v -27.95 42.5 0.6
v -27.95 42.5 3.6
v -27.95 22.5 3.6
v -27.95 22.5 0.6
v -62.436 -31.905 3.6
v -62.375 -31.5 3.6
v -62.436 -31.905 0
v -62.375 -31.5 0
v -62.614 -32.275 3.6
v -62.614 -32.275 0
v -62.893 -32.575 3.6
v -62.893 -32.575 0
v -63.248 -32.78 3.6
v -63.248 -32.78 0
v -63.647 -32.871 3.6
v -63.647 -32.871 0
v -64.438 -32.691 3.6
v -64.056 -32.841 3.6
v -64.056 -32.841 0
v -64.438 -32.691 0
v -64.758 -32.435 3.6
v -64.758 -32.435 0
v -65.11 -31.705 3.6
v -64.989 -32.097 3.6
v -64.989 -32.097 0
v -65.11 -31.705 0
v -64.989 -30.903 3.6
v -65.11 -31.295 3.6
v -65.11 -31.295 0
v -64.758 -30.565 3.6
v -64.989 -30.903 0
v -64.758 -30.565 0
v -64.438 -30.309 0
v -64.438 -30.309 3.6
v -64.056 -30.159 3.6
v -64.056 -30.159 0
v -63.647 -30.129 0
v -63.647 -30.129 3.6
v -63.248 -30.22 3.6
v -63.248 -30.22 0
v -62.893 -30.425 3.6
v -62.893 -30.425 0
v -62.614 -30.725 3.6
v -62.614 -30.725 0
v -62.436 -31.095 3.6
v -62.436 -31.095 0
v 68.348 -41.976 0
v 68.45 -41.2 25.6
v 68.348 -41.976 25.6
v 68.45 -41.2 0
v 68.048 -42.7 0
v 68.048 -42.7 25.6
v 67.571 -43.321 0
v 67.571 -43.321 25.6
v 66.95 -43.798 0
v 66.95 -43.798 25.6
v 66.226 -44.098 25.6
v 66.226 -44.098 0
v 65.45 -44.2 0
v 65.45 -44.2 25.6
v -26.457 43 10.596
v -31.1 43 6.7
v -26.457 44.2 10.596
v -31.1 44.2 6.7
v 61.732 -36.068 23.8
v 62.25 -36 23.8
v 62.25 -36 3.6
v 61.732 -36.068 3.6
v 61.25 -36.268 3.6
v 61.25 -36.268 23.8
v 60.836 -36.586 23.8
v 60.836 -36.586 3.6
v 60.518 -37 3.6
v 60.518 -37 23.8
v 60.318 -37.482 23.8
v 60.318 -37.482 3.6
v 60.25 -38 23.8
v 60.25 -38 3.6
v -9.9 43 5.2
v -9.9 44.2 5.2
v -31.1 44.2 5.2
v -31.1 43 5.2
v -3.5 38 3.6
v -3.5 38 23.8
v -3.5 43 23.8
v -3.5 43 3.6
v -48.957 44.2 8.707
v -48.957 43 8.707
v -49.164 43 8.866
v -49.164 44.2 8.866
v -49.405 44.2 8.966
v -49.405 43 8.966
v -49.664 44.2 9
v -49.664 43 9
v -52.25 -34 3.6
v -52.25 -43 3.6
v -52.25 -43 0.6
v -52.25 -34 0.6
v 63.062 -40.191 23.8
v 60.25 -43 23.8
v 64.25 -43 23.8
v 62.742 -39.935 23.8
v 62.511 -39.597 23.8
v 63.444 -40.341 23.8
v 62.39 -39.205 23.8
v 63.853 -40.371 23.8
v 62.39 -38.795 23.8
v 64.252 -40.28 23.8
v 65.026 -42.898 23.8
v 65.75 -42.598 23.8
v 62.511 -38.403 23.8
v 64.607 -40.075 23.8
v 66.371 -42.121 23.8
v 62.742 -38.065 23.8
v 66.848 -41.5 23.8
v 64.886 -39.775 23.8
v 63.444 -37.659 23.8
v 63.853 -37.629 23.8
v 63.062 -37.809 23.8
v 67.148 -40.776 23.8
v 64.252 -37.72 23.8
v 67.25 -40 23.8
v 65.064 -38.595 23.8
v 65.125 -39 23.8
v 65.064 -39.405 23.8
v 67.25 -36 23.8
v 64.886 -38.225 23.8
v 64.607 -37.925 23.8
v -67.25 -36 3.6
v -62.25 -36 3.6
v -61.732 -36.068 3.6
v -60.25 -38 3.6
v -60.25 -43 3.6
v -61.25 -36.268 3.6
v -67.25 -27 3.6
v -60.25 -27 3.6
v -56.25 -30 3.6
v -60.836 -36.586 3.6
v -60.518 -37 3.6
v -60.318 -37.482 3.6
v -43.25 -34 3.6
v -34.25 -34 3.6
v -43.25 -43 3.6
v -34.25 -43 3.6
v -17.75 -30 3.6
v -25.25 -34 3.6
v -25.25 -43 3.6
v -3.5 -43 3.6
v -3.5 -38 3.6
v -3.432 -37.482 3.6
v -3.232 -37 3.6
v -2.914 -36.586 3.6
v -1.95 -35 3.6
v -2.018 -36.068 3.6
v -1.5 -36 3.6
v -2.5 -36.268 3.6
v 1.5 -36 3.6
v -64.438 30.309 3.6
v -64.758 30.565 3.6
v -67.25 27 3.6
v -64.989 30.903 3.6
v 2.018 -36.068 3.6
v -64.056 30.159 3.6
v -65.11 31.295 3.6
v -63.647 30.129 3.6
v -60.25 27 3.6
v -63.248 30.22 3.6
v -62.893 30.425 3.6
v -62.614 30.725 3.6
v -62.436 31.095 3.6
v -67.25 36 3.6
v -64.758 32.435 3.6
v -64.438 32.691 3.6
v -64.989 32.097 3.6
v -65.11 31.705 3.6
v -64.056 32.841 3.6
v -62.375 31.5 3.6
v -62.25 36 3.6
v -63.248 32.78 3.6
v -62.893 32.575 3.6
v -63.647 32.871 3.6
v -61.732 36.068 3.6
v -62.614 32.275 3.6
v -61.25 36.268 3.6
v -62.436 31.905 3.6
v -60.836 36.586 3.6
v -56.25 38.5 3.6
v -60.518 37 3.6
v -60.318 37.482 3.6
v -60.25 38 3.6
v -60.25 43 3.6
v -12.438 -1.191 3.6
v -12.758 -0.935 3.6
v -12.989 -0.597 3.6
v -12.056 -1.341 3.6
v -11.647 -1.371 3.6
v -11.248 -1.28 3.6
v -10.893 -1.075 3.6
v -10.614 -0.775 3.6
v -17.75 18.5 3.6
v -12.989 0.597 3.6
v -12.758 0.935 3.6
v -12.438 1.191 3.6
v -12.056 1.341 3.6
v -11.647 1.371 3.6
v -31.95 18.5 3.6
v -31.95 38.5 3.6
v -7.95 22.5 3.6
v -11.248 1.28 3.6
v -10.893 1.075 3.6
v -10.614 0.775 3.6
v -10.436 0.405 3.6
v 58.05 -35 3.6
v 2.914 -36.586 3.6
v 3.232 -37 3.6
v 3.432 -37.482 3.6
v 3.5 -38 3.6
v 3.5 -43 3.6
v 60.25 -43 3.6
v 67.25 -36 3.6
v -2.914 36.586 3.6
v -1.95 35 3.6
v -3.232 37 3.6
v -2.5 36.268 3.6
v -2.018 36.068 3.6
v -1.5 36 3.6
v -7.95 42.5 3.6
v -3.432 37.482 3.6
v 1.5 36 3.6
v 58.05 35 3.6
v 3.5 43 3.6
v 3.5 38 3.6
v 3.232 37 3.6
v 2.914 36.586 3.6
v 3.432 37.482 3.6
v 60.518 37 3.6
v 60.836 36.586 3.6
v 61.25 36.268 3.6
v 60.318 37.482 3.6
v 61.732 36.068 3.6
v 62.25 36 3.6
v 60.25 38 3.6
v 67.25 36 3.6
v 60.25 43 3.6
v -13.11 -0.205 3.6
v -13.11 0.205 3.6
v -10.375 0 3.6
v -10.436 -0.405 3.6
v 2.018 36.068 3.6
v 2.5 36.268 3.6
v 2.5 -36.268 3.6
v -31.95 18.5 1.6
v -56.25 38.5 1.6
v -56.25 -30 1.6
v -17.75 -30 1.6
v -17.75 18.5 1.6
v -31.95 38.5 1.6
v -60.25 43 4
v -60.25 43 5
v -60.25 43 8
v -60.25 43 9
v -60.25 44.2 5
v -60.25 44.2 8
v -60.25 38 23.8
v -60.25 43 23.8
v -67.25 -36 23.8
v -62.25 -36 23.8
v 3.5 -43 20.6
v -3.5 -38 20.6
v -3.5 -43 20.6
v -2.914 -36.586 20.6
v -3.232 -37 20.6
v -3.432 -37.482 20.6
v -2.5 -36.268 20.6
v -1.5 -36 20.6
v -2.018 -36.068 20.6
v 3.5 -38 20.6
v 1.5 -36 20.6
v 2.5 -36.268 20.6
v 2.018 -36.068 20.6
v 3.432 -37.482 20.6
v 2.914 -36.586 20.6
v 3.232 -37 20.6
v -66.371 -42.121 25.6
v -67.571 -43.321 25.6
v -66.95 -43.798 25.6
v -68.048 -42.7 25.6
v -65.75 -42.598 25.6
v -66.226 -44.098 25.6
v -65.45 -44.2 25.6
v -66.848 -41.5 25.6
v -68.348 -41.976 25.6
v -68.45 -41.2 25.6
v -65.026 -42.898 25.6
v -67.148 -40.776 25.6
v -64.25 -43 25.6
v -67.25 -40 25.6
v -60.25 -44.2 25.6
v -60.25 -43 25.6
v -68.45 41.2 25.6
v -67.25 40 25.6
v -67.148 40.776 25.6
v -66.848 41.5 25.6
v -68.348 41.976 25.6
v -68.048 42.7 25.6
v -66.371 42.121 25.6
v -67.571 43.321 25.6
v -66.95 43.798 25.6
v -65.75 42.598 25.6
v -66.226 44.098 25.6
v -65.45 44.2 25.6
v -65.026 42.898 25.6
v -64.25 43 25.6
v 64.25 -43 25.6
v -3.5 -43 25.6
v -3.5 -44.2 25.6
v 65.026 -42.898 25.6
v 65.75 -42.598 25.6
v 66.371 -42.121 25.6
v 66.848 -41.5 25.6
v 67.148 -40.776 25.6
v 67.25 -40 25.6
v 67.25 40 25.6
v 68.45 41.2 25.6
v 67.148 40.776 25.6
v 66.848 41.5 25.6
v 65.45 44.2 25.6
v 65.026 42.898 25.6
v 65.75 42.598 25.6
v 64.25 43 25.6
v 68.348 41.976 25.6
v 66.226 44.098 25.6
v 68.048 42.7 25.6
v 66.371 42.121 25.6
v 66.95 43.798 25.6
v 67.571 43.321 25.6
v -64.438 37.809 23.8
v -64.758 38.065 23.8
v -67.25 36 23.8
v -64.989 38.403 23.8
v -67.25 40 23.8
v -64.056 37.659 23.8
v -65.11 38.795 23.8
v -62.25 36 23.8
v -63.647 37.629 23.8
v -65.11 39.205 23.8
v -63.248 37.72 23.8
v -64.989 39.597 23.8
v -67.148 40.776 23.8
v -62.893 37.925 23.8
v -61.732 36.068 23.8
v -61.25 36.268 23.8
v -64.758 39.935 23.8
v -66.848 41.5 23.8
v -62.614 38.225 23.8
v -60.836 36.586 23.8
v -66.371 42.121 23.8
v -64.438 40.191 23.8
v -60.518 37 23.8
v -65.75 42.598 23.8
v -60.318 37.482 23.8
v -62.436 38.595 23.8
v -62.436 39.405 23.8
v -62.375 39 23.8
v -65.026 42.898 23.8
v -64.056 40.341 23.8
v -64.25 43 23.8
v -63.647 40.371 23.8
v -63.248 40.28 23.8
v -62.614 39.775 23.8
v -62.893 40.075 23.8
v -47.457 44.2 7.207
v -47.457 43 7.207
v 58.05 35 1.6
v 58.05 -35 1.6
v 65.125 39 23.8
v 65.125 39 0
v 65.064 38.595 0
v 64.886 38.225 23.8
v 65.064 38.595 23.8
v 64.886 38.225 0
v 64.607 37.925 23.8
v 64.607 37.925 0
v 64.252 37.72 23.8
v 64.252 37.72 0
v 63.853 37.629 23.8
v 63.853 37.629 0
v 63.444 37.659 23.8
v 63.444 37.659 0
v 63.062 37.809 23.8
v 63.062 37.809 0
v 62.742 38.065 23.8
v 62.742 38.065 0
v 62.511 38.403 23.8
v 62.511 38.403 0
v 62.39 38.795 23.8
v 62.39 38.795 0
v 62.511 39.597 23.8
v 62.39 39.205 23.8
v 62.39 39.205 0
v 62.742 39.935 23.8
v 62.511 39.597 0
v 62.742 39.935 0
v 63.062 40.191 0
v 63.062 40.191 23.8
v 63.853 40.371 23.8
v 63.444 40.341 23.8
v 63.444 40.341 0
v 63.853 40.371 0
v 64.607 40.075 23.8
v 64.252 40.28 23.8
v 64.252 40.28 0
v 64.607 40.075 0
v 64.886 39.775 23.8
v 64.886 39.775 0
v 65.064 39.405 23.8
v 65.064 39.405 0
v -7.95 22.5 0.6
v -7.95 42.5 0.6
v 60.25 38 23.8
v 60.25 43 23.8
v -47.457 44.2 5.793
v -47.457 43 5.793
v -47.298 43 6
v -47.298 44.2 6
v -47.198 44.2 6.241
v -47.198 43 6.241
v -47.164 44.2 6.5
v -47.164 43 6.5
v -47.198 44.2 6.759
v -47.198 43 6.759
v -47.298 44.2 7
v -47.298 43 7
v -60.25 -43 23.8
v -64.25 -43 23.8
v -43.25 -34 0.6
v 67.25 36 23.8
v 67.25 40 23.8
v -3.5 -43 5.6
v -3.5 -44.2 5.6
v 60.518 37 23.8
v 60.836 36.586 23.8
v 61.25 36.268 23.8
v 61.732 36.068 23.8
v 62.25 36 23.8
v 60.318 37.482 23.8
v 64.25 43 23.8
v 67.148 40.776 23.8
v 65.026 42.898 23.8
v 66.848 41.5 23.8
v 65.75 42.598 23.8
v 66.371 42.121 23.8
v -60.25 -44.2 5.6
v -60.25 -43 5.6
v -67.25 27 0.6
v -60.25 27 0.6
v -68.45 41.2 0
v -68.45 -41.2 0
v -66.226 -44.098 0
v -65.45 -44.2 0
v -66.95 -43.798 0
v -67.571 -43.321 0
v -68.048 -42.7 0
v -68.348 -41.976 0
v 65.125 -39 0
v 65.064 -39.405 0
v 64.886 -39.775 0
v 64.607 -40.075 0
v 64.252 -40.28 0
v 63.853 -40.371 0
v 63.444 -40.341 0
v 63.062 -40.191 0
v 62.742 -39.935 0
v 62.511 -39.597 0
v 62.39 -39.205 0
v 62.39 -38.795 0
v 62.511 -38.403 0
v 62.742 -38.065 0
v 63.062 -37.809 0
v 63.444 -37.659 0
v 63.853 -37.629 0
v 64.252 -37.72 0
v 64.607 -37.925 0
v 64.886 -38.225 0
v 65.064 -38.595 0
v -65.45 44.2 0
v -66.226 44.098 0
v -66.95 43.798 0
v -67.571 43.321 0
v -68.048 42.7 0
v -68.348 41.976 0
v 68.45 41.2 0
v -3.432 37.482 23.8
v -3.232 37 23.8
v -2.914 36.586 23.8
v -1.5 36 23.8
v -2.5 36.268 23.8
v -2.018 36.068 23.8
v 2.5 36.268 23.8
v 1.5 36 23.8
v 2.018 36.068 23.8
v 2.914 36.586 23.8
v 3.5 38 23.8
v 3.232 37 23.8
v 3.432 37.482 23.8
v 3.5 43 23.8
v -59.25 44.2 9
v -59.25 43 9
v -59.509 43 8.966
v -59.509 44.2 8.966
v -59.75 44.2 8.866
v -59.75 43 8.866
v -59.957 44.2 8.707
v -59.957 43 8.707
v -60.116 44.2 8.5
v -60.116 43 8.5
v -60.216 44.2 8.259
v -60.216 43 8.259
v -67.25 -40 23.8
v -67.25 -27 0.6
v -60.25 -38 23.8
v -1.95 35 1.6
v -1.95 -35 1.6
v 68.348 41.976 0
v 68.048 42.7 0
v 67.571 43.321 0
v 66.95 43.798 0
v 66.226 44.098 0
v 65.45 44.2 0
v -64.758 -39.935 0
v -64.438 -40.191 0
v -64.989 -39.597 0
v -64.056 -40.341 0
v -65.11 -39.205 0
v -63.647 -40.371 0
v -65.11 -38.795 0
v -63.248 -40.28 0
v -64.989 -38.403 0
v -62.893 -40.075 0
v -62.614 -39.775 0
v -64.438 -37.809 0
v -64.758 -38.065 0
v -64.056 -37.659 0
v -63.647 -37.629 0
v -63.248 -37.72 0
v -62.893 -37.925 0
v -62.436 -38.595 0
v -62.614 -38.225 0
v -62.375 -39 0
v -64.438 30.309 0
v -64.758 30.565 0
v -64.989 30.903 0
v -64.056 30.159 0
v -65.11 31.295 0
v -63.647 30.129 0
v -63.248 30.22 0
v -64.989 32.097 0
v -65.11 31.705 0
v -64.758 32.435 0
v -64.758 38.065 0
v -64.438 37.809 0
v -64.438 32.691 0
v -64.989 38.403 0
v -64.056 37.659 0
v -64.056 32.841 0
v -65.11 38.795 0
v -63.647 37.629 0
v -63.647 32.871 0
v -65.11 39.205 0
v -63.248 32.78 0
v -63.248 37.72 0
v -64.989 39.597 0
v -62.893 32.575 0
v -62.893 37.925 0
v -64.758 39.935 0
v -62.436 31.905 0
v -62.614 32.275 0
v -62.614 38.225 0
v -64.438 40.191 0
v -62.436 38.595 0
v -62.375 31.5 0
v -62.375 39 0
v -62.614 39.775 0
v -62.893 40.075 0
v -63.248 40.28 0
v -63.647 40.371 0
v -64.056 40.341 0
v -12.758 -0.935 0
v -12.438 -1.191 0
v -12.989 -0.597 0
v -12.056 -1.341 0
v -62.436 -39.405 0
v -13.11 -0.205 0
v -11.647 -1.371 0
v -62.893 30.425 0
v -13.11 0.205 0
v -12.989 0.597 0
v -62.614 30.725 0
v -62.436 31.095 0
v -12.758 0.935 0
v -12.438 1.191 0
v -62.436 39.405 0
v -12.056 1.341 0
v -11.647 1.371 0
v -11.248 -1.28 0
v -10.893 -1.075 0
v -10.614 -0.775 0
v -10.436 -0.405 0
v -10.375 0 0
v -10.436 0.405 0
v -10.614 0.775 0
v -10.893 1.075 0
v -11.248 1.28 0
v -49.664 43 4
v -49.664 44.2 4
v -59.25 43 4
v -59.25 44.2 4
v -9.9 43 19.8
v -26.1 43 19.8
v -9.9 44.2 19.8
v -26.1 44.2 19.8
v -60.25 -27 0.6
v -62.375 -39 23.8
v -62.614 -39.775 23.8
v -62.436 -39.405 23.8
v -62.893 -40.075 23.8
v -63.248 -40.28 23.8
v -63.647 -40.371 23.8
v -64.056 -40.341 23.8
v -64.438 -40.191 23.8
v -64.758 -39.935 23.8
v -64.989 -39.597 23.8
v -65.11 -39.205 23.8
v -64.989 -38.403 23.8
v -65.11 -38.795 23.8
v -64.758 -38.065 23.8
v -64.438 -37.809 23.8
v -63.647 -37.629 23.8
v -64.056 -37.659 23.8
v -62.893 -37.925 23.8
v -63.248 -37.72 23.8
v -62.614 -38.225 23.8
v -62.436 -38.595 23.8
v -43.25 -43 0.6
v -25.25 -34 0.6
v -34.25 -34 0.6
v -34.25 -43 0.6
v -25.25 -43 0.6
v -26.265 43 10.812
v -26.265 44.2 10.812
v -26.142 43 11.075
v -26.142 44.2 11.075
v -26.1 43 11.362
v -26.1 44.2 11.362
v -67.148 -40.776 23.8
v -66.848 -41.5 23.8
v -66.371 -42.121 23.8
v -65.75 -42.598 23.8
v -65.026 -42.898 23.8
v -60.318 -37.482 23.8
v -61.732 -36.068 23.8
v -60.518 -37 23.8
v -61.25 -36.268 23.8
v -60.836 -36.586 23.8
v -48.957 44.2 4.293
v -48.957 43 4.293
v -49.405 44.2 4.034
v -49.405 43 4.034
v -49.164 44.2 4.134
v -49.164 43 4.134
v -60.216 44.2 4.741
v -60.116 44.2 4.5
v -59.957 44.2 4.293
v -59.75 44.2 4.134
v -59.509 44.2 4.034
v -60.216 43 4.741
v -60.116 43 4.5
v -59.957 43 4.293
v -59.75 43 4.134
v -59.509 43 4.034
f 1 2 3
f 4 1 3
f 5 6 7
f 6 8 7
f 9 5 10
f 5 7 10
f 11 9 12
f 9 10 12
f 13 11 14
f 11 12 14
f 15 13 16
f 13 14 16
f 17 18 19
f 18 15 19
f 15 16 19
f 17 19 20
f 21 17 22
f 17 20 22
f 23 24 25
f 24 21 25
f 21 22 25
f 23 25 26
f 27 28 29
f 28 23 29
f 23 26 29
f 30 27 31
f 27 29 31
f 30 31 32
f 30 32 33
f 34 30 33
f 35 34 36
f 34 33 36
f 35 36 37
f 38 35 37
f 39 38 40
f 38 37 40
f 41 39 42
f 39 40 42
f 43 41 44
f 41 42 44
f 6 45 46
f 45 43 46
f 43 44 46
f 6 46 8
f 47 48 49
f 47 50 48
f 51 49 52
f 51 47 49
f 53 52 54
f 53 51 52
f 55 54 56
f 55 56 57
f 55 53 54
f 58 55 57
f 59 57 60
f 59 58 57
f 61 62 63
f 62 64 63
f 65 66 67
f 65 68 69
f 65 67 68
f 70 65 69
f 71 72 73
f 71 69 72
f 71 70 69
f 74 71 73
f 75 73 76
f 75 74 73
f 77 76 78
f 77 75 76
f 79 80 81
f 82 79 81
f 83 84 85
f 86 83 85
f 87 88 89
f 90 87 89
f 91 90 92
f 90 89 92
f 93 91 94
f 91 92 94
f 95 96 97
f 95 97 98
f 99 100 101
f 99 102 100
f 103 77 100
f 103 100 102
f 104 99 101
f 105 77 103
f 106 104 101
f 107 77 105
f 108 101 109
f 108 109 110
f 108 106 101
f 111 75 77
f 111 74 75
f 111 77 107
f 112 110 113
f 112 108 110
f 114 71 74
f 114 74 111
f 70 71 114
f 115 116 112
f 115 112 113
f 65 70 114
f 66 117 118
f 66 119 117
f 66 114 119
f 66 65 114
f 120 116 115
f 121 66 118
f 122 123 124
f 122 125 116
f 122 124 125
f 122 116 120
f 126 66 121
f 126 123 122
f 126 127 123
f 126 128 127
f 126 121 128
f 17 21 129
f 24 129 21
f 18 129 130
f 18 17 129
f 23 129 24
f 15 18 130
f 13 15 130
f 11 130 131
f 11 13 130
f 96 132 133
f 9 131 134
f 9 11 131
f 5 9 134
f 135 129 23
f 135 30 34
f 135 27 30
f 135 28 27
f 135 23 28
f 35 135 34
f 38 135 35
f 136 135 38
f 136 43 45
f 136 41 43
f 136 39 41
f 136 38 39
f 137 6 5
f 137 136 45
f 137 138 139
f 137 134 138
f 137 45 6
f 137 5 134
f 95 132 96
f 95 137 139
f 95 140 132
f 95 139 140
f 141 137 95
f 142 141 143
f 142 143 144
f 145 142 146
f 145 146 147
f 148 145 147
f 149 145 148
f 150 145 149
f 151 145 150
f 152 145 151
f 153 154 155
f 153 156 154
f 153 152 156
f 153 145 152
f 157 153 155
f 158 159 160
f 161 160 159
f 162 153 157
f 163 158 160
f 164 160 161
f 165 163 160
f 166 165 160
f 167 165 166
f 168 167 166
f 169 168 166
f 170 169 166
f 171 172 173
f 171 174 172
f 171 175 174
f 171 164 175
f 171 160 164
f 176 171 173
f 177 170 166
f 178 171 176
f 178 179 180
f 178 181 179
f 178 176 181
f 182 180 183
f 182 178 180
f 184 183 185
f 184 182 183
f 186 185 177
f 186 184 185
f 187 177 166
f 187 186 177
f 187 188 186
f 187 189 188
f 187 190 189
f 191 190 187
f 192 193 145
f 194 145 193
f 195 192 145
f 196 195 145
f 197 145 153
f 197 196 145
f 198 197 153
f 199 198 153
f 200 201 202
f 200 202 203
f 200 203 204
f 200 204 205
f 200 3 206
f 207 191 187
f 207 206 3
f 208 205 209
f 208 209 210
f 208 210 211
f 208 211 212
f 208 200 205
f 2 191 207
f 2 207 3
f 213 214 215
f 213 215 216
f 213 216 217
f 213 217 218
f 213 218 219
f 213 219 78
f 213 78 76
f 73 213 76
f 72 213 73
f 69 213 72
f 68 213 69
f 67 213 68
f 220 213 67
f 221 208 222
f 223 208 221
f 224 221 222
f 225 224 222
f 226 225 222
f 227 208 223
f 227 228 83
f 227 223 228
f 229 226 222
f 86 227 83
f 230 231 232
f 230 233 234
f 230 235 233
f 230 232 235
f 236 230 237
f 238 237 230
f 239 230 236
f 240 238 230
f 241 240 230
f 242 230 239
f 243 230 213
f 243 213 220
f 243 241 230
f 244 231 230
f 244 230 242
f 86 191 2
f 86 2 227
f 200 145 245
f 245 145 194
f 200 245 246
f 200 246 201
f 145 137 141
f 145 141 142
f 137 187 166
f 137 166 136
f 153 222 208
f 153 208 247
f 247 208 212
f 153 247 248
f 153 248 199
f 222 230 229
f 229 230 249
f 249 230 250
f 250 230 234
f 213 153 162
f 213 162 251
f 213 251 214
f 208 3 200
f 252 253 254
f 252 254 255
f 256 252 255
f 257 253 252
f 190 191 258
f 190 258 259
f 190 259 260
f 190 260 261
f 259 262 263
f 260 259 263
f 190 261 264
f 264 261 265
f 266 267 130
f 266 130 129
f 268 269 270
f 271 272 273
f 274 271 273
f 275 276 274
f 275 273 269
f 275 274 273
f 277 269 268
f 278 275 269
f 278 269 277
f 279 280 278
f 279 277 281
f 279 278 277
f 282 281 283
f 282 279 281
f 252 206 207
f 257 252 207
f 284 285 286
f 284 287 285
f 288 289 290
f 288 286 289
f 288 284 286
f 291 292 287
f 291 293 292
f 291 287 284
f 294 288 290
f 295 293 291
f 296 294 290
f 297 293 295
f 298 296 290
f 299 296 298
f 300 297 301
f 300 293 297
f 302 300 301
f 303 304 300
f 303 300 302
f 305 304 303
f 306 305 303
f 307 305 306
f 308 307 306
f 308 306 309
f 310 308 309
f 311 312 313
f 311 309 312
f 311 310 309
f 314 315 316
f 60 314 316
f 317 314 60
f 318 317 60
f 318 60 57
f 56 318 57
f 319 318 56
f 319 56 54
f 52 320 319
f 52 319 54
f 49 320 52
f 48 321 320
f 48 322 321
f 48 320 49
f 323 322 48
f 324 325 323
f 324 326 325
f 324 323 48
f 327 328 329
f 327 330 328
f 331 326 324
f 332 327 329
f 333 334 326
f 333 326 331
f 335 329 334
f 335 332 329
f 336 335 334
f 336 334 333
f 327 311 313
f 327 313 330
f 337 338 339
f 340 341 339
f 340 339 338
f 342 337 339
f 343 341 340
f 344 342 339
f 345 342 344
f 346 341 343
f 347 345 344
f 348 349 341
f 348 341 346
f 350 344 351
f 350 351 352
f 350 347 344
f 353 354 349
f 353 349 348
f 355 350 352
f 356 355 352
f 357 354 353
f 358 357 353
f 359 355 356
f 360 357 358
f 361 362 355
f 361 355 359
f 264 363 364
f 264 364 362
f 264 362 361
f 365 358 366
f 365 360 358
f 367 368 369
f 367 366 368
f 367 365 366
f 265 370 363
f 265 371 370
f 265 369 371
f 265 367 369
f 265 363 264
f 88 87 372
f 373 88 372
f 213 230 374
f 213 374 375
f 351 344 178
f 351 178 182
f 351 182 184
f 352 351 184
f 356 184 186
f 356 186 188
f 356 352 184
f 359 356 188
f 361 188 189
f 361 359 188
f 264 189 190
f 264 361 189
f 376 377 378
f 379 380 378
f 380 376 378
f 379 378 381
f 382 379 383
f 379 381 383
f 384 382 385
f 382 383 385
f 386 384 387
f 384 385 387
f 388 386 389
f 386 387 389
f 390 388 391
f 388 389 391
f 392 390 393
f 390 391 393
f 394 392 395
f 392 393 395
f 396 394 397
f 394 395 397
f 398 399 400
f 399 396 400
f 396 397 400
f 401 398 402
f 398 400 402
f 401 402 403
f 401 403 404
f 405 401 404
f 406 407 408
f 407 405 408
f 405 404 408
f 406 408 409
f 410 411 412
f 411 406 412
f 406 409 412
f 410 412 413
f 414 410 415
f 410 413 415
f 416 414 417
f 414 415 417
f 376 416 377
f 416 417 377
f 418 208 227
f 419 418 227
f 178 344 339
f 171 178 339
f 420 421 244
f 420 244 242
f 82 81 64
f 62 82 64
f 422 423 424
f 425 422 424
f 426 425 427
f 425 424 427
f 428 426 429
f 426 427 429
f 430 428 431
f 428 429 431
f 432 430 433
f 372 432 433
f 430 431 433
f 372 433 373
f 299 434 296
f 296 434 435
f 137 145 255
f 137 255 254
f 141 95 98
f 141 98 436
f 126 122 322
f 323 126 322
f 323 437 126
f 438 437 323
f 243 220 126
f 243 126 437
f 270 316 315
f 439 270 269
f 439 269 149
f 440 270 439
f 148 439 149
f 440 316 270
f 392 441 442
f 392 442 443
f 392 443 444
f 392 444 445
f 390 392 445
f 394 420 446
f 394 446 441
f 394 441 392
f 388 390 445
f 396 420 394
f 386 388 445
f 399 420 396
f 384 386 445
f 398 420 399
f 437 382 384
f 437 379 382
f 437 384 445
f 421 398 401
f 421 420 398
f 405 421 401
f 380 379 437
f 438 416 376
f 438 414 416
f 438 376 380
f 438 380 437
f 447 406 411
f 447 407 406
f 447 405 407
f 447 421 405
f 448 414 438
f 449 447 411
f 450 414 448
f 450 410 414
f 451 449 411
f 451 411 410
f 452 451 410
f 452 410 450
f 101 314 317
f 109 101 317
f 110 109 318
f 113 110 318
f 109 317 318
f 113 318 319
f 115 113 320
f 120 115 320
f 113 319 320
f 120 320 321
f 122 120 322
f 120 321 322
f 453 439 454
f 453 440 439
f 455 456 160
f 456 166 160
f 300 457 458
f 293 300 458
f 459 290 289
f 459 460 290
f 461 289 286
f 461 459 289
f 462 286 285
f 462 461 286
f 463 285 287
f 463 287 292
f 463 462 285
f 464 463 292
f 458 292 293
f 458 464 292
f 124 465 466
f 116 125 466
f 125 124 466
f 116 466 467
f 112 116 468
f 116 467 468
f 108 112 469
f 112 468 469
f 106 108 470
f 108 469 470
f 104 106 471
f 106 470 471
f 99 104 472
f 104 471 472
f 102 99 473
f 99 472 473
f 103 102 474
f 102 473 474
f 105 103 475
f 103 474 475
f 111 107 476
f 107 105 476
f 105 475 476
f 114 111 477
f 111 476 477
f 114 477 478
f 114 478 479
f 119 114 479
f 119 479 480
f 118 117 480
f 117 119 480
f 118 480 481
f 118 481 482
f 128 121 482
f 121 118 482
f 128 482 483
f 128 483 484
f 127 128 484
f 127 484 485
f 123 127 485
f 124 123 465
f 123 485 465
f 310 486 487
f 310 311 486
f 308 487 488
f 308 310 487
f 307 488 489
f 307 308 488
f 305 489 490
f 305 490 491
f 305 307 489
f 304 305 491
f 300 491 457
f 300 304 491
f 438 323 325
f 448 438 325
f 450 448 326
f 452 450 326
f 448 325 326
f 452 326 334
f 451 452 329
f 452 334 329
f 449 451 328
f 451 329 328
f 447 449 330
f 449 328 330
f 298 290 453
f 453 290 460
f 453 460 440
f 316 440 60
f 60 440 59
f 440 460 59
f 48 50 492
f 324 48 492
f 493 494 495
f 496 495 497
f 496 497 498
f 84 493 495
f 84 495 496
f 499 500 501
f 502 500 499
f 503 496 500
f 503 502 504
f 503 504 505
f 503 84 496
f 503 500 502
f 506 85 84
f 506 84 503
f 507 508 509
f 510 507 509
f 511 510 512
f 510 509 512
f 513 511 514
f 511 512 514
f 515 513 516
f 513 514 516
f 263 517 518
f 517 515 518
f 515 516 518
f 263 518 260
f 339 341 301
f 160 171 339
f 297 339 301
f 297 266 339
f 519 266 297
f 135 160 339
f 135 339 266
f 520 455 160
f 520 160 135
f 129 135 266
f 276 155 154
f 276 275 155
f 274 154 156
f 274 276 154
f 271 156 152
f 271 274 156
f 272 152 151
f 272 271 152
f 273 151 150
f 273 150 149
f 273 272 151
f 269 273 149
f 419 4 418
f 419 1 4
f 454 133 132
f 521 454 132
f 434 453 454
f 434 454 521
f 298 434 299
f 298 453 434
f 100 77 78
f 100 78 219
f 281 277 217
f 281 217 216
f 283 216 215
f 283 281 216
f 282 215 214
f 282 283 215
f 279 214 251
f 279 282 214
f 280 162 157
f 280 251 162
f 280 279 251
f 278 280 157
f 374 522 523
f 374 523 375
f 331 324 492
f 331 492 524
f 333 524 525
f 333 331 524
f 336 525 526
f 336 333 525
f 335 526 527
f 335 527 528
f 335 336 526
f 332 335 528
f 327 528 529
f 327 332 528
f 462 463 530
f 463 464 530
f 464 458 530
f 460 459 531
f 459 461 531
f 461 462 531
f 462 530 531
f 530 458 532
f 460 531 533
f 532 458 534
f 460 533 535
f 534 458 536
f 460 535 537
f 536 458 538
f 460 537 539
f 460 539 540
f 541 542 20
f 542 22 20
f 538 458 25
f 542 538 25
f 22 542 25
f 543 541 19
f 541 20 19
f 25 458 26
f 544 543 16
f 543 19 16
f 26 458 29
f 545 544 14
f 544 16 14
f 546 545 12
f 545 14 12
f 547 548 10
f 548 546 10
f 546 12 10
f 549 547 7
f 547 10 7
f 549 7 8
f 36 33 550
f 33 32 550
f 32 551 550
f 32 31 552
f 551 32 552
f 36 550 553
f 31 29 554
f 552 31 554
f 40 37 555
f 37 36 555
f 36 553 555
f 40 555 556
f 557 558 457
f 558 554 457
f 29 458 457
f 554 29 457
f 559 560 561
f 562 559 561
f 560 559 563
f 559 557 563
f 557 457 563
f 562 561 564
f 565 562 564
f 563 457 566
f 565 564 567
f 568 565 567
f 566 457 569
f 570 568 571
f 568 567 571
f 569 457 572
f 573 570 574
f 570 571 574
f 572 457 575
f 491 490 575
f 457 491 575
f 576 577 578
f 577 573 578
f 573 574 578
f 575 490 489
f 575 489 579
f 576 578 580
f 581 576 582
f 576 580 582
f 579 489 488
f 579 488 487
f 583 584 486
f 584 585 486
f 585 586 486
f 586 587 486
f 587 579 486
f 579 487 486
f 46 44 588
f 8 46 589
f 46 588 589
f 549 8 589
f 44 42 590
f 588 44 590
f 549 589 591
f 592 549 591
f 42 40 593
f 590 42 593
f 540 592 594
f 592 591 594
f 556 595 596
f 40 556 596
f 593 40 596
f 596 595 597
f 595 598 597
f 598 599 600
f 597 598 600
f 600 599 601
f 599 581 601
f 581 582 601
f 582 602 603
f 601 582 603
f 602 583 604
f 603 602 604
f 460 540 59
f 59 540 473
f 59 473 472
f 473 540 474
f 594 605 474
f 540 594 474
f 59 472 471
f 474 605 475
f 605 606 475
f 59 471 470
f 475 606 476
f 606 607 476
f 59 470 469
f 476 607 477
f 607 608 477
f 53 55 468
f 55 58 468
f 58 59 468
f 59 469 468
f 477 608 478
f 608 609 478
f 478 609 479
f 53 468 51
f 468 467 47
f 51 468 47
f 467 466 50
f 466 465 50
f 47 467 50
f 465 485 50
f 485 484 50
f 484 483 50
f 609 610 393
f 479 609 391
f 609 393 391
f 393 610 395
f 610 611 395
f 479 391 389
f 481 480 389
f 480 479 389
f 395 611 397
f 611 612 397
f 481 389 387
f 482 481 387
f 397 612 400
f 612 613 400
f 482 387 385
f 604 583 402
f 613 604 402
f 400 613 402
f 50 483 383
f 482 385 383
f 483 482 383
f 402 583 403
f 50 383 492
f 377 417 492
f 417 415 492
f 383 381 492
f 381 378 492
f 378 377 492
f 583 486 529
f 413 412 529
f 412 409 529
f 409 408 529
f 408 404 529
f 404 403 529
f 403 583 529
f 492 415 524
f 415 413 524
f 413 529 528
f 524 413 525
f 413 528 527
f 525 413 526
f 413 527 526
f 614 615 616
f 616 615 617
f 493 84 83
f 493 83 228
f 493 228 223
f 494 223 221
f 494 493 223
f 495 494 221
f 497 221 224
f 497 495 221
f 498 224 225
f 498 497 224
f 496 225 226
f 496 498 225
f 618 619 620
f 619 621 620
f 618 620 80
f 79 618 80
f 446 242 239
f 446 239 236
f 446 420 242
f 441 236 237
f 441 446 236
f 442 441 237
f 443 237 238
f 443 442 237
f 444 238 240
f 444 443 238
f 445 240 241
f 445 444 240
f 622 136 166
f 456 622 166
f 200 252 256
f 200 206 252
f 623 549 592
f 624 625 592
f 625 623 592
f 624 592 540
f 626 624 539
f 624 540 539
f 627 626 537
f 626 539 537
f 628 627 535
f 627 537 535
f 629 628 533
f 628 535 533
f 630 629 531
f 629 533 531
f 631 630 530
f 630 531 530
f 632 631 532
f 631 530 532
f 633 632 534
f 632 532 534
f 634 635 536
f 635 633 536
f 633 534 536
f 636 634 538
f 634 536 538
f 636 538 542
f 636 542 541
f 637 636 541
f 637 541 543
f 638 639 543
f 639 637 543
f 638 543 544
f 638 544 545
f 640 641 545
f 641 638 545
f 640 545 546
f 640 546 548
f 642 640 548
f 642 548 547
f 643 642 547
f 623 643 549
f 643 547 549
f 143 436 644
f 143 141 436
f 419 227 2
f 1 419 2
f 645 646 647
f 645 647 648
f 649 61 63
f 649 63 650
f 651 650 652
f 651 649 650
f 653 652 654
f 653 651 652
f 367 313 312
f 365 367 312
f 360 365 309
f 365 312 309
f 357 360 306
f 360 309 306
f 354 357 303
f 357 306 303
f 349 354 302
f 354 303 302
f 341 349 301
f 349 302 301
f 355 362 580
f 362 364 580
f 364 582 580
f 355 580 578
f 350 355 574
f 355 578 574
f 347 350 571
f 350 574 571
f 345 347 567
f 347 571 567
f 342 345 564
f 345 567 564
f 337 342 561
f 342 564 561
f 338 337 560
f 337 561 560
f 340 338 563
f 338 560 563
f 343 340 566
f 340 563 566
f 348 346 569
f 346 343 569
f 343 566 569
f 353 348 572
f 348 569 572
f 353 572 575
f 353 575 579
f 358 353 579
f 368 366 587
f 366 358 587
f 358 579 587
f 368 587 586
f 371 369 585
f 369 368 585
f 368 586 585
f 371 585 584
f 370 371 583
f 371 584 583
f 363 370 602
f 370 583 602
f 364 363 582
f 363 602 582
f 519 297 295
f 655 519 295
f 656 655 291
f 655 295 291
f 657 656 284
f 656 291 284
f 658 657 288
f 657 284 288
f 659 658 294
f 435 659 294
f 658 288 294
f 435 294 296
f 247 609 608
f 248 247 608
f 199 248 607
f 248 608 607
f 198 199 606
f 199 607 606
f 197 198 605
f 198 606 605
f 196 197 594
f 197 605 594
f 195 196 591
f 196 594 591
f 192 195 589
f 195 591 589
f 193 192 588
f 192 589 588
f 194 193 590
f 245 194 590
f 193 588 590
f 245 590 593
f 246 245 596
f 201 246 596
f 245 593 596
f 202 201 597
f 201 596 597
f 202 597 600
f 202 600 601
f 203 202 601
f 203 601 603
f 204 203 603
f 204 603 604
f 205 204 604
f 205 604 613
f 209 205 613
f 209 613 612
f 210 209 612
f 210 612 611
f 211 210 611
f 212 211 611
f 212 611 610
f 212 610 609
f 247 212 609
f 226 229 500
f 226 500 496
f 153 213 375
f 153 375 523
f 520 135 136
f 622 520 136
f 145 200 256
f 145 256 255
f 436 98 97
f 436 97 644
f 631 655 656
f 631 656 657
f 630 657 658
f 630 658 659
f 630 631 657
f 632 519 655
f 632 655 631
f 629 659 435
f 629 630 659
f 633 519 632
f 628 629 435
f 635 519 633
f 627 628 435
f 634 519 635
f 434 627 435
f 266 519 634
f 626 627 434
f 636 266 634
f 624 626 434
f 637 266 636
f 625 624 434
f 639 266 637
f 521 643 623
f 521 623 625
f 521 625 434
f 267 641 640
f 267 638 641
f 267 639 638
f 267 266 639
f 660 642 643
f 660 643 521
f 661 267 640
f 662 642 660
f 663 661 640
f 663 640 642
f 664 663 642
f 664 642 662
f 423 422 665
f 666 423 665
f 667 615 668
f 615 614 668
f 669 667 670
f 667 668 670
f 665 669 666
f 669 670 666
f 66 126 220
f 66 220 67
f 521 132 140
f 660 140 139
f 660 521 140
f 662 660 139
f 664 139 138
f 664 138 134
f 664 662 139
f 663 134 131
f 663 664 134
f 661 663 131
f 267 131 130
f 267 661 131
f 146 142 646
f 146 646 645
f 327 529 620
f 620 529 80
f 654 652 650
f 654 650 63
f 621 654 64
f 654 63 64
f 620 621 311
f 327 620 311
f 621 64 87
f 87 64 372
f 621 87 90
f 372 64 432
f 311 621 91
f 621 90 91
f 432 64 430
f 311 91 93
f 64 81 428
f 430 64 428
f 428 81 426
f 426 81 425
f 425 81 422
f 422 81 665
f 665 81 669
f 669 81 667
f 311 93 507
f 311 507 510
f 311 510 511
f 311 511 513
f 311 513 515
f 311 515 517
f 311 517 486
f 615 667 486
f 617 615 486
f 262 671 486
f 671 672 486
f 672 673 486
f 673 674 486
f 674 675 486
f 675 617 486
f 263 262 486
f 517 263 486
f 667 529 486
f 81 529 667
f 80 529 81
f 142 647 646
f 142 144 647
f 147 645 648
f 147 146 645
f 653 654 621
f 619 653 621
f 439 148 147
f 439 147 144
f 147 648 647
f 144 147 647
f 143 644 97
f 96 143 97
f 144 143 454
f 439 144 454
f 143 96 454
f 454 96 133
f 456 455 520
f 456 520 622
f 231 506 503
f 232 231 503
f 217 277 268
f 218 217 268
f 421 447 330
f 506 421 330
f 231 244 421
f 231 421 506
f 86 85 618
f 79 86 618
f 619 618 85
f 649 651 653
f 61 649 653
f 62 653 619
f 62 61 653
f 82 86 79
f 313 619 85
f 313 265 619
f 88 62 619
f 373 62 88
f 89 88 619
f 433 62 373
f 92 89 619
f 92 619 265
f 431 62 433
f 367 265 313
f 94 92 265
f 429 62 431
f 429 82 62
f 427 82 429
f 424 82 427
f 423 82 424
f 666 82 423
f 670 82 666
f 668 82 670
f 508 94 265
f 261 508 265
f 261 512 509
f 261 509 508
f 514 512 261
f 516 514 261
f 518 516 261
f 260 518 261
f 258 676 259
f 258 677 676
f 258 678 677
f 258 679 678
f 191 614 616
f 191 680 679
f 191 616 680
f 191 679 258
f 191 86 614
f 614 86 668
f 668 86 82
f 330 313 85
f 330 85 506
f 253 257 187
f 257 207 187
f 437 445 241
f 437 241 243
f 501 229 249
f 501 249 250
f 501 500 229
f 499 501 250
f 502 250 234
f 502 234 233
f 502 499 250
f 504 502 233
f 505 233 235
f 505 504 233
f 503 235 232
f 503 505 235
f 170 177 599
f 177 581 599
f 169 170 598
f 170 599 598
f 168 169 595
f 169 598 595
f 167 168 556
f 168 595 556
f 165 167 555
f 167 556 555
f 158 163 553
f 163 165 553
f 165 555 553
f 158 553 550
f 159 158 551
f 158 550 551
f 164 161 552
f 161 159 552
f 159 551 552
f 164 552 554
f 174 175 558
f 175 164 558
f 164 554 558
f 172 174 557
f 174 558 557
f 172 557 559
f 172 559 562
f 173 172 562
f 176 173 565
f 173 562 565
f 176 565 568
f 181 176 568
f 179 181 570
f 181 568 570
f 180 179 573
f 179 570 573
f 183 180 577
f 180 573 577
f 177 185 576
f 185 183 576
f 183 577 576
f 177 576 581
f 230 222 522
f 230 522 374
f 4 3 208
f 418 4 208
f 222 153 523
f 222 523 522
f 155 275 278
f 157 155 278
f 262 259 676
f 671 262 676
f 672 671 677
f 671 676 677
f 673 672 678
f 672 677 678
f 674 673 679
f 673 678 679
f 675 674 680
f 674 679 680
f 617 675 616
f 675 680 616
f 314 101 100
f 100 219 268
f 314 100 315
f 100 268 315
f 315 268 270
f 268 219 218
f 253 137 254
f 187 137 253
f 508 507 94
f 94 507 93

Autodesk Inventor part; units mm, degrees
ref_plane "YZ Plane" through (0, 0, 0) normal (1, 0, 0) x (0, 1, 0)
ref_plane "XZ Plane" through (0, 0, 0) normal (0, 1, 0) x (-1, 0, 0)
ref_plane "XY Plane" through (0, 0, 0) normal (0, 0, 1) x (1, 0, 0)
sketch "Skizze1" plane through (0, 0, 0) normal (0, 0, 1) x (1, 0, 0)
  line L0 (-68.45, -44.2) -> (68.45, -44.2)
  line L1 (68.45, -44.2) -> (68.45, 44.2)
  line L2 (68.45, 44.2) -> (-68.45, 44.2)
  line L3 (-68.45, 44.2) -> (-68.45, -44.2)
  line L4 (-68.45, -44.2) -> (68.45, 44.2) construction
  line L5 (68.45, -44.2) -> (-68.45, 44.2) construction
  circle A0 centre (-63.75, -39) radius 1.375
  circle A1 centre (63.75, -39) radius 1.375
  circle A2 centre (63.75, 39) radius 1.375
  circle A3 centre (-63.75, 39) radius 1.375
  line L6 (0, 61.88) -> (0, -61.88) projected
  line L7 (-95.83, 0) -> (95.83, 0) projected
  circle A4 centre (-63.75, 31.5) radius 1.375
  circle A5 centre (-63.75, -31.5) radius 1.375
  line L8 (-63.75, 39) -> (-63.75, 31.5) construction
  circle A6 centre (-11.75, 0) radius 1.375
  point P0 (0, 0)
  dimension "d0" = 136.9
  dimension "d1" = 88.4
  dimension "d2" = 2.75
  dimension "d3" = 127.5
  dimension "d4" = 78
  dimension "d7" = 63
  dimension "d8" = 2.75
  dimension "d9" = 2.75
  dimension "d10" = 52
extrude "Extrusion1" add sketch "Skizze1" along normal blind 3.6 contours L3 L7 A6 L6 L0 | L6 L7 L1 L0 | L3 L2 L6 L7 A6 | L6 L2 L1 L7
sketch "Skizze2" plane through (0, 0, 0) normal (0, 0, -1) x (-1, 0, 0)
  circle A0 centre (63.75, -31.5) radius 1.375 projected
  circle A1 centre (63.75, 31.5) radius 1.375 projected
  circle A2 centre (11.75, 0) radius 1.375 projected
  line L0 (67.05, -28.2) -> (60.45, -28.2)
  line L1 (60.45, -28.2) -> (60.45, -34.8)
  line L2 (60.45, -34.8) -> (67.05, -34.8)
  line L3 (67.05, -34.8) -> (67.05, -28.2)
  line L4 (67.05, -28.2) -> (60.45, -34.8) construction
  line L5 (60.45, -28.2) -> (67.05, -34.8) construction
  line L6 (67.05, 34.8) -> (60.45, 34.8)
  line L7 (60.45, 34.8) -> (60.45, 28.2)
  line L8 (60.45, 28.2) -> (67.05, 28.2)
  line L9 (67.05, 28.2) -> (67.05, 34.8)
  circle A3 centre (63.75, 31.5) radius 1.375 projected
  line L10 (67.05, 34.8) -> (60.45, 28.2) construction
  line L11 (60.45, 34.8) -> (67.05, 28.2) construction
  line L12 (15.05, 3.3) -> (8.45, 3.3)
  line L13 (8.45, 3.3) -> (8.45, -3.3)
  line L14 (8.45, -3.3) -> (15.05, -3.3)
  line L15 (15.05, -3.3) -> (15.05, 3.3)
  line L16 (15.05, 3.3) -> (8.45, -3.3) construction
  line L17 (8.45, 3.3) -> (15.05, -3.3) construction
  point P0 (0, 0)
  dimension "d11" = 6.6
  dimension "d12" = 6.6
extrude "Extrusion2" [suppressed]
sketch "Skizze3" plane through (0, 0, 3.6) normal (0, 0, 1) x (1, 0, 0)
  circle A0 centre (-63.75, 31.5) radius 1.375 projected
  circle A1 centre (-63.75, -31.5) radius 1.375 projected
  circle A2 centre (-11.75, 0) radius 1.375 projected
  line L0 (-63.75, 31.5) -> (-63.75, -31.5) construction
  line L1 (-95.83, 0) -> (95.83, 0) projected
  line L2 (-67.25, -27) -> (-60.25, -27)
  line L3 (-60.25, -27) -> (-60.25, 27)
  line L4 (-60.25, 27) -> (-67.25, 27)
  line L5 (-67.25, 27) -> (-67.25, -27)
  line L6 (-67.25, -27) -> (-60.25, 27) construction
  line L7 (-60.25, -27) -> (-67.25, 27) construction
  line L8 (-52.25, -34) -> (-43.25, -34)
  line L9 (-43.25, -34) -> (-43.25, -43)
  line L10 (-43.25, -43) -> (-52.25, -43)
  line L11 (-52.25, -43) -> (-52.25, -34)
  line L12 (-34.25, -34) -> (-25.25, -34)
  line L13 (-25.25, -34) -> (-25.25, -43)
  line L14 (-25.25, -43) -> (-34.25, -43)
  line L15 (-34.25, -43) -> (-34.25, -34)
  line L16 (-47.75, -34) -> (-47.75, -43) construction
  line L17 (-29.75, -34) -> (-29.75, -43) construction
  line L18 (-52.25, -38.5) -> (-43.25, -38.5) construction
  line L19 (-27.95, 22.5) -> (-7.95, 22.5)
  line L20 (-7.95, 22.5) -> (-7.95, 42.5)
  line L21 (-7.95, 42.5) -> (-27.95, 42.5)
  line L22 (-27.95, 42.5) -> (-27.95, 22.5)
  line L23 (-17.95, 42.5) -> (-17.95, 22.5) construction
  point P0 (0, 0)
  point P1 (-63.75, 0)
  dimension "d15" = 7
  dimension "d16" = 54
  dimension "d17" = 9
  dimension "d18" = 9
  dimension "d19" = 9
  dimension "d20" = 18
  dimension "d21" = 16
  dimension "d22" = 7
  dimension "d23" = 20
  dimension "d25" = 11
  dimension "d26" = 20
  dimension "d29" = 45.8
extrude "Extrusion3" cut sketch "Skizze3" against normal blind 3 contours L3 L2 L5 L1 | L1 L5 L4 L3 | L8 L9 L10 L11 | L12 L13 L14 L15 | L22 L21 L20 L19
sketch "Skizze4" plane through (0, 0, 3.6) normal (0, 0, 1) x (1, 0, 0)
  line L0 (-31.95, 18.5) -> (-17.75, 18.5)
  line L1 (-17.75, 18.5) -> (-17.75, -30)
  line L2 (-17.75, -30) -> (-56.25, -30)
  line L3 (-56.25, -30) -> (-56.25, 38.5)
  line L4 (-31.95, 18.5) -> (-31.95, 38.5)
  line L5 (-31.95, 38.5) -> (-56.25, 38.5)
  line L6 (-1.95, 35) -> (58.05, 35)
  line L7 (58.05, 35) -> (58.05, -35)
  line L8 (58.05, -35) -> (-1.95, -35)
  line L9 (-1.95, -35) -> (-1.95, 35)
  line L10 (-7.95, 22.5) -> (-27.95, 22.5) projected
  line L11 (-7.95, 42.5) -> (-7.95, 22.5) projected
  line L12 (-27.95, 42.5) -> (-7.95, 42.5) projected
  line L13 (-27.95, 22.5) -> (-27.95, 42.5) projected
  line L14 (-60.25, -27) -> (-67.25, -27) projected
  line L15 (-60.25, 27) -> (-60.25, -27) projected
  line L16 (-67.25, 27) -> (-60.25, 27) projected
  line L17 (-67.25, -27) -> (-67.25, 27) projected
  line L18 (-34.25, -34) -> (-25.25, -34) projected
  line L19 (-34.25, -43) -> (-34.25, -34) projected
  line L20 (-25.25, -43) -> (-34.25, -43) projected
  line L21 (-25.25, -34) -> (-25.25, -43) projected
  circle A0 centre (-11.75, 0) radius 1.375 projected
  line L22 (-95.83, 0) -> (95.83, 0) projected
  line L23 (0, 61.88) -> (0, -61.88) projected
  point P0 (0, 0)
  dimension "d30" = 4
  dimension "d31" = 4
  dimension "d32" = 4
  dimension "d34" = 4
  dimension "d35" = 6
  dimension "d36" = 4
  dimension "d37" = 6
  dimension "d38" = 70
  dimension "d39" = 60
extrude "Extrusion4" cut sketch "Skizze4" against normal blind 2 contours L9 L6 L23 L22 | L22 L23 L8 L9 | L0 L1 L22 L3 L5 L4 | L1 L2 L3 L22 | L23 L6 L7 L22 | L22 L7 L8 L23
sketch "Skizze5" plane through (0, 0, 3.6) normal (0, 0, 1) x (1, 0, 0)
  circle A0 centre (-63.75, 39) radius 1.375 projected
  circle A1 centre (-63.75, -39) radius 1.375 projected
  circle A2 centre (63.75, -39) radius 1.375 projected
  circle A3 centre (63.75, 39) radius 1.375 projected
  line L0 (-67.25, 43) -> (-60.25, 43)
  line L1 (-60.25, 43) -> (-60.25, 36)
  line L2 (-60.25, 36) -> (-67.25, 36)
  line L3 (-67.25, 36) -> (-67.25, 43)
  line L4 (-67.25, -43) -> (-60.25, -43)
  line L5 (-60.25, -43) -> (-60.25, -36)
  line L6 (-60.25, -36) -> (-67.25, -36)
  line L7 (-67.25, -36) -> (-67.25, -43)
  line L8 (60.25, 36) -> (67.25, 36)
  line L9 (67.25, 36) -> (67.25, 43)
  line L10 (67.25, 43) -> (60.25, 43)
  line L11 (60.25, 43) -> (60.25, 36)
  circle A4 centre (63.75, 39) radius 1.375 projected
  line L12 (60.25, -43) -> (67.25, -43)
  line L13 (67.25, -43) -> (67.25, -36)
  line L14 (67.25, -36) -> (60.25, -36)
  line L15 (60.25, -36) -> (60.25, -43)
  line L16 (0, 61.88) -> (0, -61.88) projected
  line L17 (-95.83, 0) -> (95.83, 0) projected
  line L18 (-63.75, 36) -> (-63.75, 43) construction
  line L19 (3.5, -43) -> (-3.5, -43)
  line L20 (-3.5, -43) -> (-3.5, -36)
  line L21 (-3.5, -36) -> (3.5, -36)
  line L22 (3.5, -36) -> (3.5, -43)
  line L23 (3.5, 36) -> (-3.5, 36)
  line L24 (-3.5, 36) -> (-3.5, 43)
  line L25 (-3.5, 43) -> (3.5, 43)
  line L26 (3.5, 43) -> (3.5, 36)
  point P0 (0, 0)
  dimension "d42" = 7
  dimension "d46" = 3
  dimension "d47" = 4
  dimension "d51" = 7
extrude "Extrusion5" add sketch "Skizze5" along normal blind 20.2
sketch "Skizze7" plane through (0, 0, 23.8) normal (0, 0, 1) x (1, 0, 0)
  line L0 (-3.5, -43) -> (3.5, -43) projected
  line L1 (3.5, -43) -> (3.5, -36) projected
  line L2 (3.5, -36) -> (-3.5, -36) projected
  line L3 (-3.5, -36) -> (-3.5, -43) projected
  point P0 (0, 0)
extrude "Extrusion7" cut sketch "Skizze7" against normal blind 3.2
fillet "Rundung1" radius 2 8 edges at (-60.25, 36, 13.7) (-60.25, -36, 13.7) (60.25, 36, 13.7) (60.25, -36, 13.7) (3.5, -36, 12.1) (3.5, 36, 13.7) (-3.5, 36, 13.7) (-3.5, -36, 12.1)
sketch "Skizze6" plane through (0, 0, 3.6) normal (0, 0, 1) x (1, 0, 0)
  line L0 (-60.25, 43) -> (-67.25, 43) projected
  line L1 (-67.25, 43) -> (-67.25, 36) projected
  line L2 (67.25, -43) -> (67.25, -36) projected
  line L3 (60.25, -43) -> (67.25, -43) projected
  line L4 (-67.25, 43) -> (67.25, 43)
  line L5 (67.25, 43) -> (67.25, -43)
  line L6 (67.25, -43) -> (-67.25, -43)
  line L7 (-67.25, -43) -> (-67.25, 43)
  line L8 (68.45, 44.2) -> (-68.45, 44.2)
  line L9 (-68.45, 44.2) -> (-68.45, -44.2)
  line L10 (-68.45, -44.2) -> (68.45, -44.2)
  line L11 (68.45, -44.2) -> (68.45, 44.2)
  point P0 (0, 0)
  dimension "d48" = 1.2
extrude "Extrusion6" add sketch "Skizze6" along normal blind 22
sketch "Skizze8" plane through (-68.45, 44.2, 0) normal (0, 1, 0) x (1, 0, 0)
  line L0 (68.45, 3.96) -> (68.45, -23.76) projected
  line L1 (164.28, 0) -> (-27.38, 0) projected
  line L2 (19.2, -4) -> (8.2, -4)
  line L3 (8.2, -4) -> (8.2, -9)
  line L4 (8.2, -9) -> (19.2, -9)
  line L5 (19.2, -9) -> (19.2, -4)
  line L6 (19.2, -4) -> (8.2, -9) construction
  line L7 (8.2, -4) -> (19.2, -9) construction
  line L8 (58.55, -5.2) -> (42.35, -5.2)
  line L9 (42.35, -5.2) -> (42.35, -19.8)
  line L10 (42.35, -19.8) -> (58.55, -19.8)
  line L11 (58.55, -19.8) -> (58.55, -5.2)
  line L12 (58.55, -5.2) -> (42.35, -19.8) construction
  line L13 (42.35, -5.2) -> (58.55, -19.8) construction
  line L14 (42.35, -5.2) -> (37.35, -5.2)
  line L15 (37.35, -5.2) -> (37.35, -6.7)
  line L16 (37.35, -6.7) -> (42.35, -10.8955)
  line L17 (19.2, -9) -> (21.7, -6.5)
  line L18 (21.7, -6.5) -> (19.2, -4)
  line L19 (21.7, -6.5) -> (13.7, -6.5) construction
  point P0 (68.45, 0)
  point P1 (50.45, -12.5)
  dimension "d55" = 54.75
  dimension "d56" = 6.5
  dimension "d57" = 11
  dimension "d58" = 5
  dimension "d61" = 18
  dimension "d63" = 14.6
  dimension "d64" = 16.2
  dimension "d65" = 5.2
  dimension "d66" = 50
  dimension "d67" = 1.5
  dimension "d68" = 5
  dimension "d69" = 2.5
extrude "Extrusion8" cut sketch "Skizze8" against normal up to surface (1.2 mm away)
sketch "Skizze9" plane through (-68.45, -44.2, 0) normal (0, -1, 0) x (1, 0, 0)
  line L0 (0, 0) -> (136.9, 0) projected
  line L1 (136.9, 0) -> (136.9, 25.6) projected
  line L2 (0, 25.6) -> (136.9, 25.6) projected
  line L3 (0, 0) -> (0, 25.6) projected
  line L4 (135.7, 25.6) -> (1.2, 25.6) projected
  line L5 (8.2, 25.6) -> (64.95, 25.6)
  line L6 (64.95, 25.6) -> (64.95, 5.6)
  line L7 (64.95, 5.6) -> (8.2, 5.6)
  line L8 (8.2, 5.6) -> (8.2, 25.6)
  line L9 (16.2, 3.6) -> (25.2, 3.6) projected
  line L10 (16.2, 3.6) -> (16.2, 0.6) projected
  line L11 (16.2, 0.6) -> (25.2, 0.6) projected
  line L12 (25.2, 3.6) -> (25.2, 0.6) projected
  line L13 (34.2, 3.6) -> (43.2, 3.6) projected
  line L14 (34.2, 3.6) -> (34.2, 0.6) projected
  line L15 (34.2, 0.6) -> (43.2, 0.6) projected
  line L16 (43.2, 3.6) -> (43.2, 0.6) projected
  line L17 (16.2, 0.6) -> (25.2, 0.6) construction
  line L18 (20.7, 0.6) -> (20.7, 3.6) construction
  line L19 (34.2, 0.6) -> (43.2, 0.6) construction
  line L20 (38.7, 0.6) -> (38.7, 3.6) construction
  line L21 (8.2, 23.8) -> (8.2, 3.6) projected
  line L22 (8.2, 3.6) -> (8.2, 23.8) projected
  point P0 (68.45, 0)
  dimension "d73" = 64.95
  dimension "d75" = 2
extrude "Extrusion9" cut sketch "Skizze9" against normal up to surface (1.2 mm away) contours L2 L6 L7 L8
fillet "Rundung2" radius 3 8 edges at (-68.45, -44.2, 12.8) (-68.45, 44.2, 12.8) (68.45, -44.2, 12.8) (68.45, 44.2, 12.8) (67.25, 43, 24.7) (67.25, -43, 24.7) (-67.25, -43, 24.7) (-67.25, 43, 24.7)
fillet "Rundung3" radius 1 6 edges at (-26.1, 43.6, 10.8955) (-49.25, 43.6, 9) (-49.25, 43.6, 4) (-46.75, 43.6, 6.5) (-60.25, 43.6, 9) (-60.25, 43.6, 4)
equation "\"d9\" = d8"
equation "\"d18\" = d17"
equation "\"d51\" = d42"
properties part number "Gehaeuse BS v3" material "PC/ABS-Kunststoff"
